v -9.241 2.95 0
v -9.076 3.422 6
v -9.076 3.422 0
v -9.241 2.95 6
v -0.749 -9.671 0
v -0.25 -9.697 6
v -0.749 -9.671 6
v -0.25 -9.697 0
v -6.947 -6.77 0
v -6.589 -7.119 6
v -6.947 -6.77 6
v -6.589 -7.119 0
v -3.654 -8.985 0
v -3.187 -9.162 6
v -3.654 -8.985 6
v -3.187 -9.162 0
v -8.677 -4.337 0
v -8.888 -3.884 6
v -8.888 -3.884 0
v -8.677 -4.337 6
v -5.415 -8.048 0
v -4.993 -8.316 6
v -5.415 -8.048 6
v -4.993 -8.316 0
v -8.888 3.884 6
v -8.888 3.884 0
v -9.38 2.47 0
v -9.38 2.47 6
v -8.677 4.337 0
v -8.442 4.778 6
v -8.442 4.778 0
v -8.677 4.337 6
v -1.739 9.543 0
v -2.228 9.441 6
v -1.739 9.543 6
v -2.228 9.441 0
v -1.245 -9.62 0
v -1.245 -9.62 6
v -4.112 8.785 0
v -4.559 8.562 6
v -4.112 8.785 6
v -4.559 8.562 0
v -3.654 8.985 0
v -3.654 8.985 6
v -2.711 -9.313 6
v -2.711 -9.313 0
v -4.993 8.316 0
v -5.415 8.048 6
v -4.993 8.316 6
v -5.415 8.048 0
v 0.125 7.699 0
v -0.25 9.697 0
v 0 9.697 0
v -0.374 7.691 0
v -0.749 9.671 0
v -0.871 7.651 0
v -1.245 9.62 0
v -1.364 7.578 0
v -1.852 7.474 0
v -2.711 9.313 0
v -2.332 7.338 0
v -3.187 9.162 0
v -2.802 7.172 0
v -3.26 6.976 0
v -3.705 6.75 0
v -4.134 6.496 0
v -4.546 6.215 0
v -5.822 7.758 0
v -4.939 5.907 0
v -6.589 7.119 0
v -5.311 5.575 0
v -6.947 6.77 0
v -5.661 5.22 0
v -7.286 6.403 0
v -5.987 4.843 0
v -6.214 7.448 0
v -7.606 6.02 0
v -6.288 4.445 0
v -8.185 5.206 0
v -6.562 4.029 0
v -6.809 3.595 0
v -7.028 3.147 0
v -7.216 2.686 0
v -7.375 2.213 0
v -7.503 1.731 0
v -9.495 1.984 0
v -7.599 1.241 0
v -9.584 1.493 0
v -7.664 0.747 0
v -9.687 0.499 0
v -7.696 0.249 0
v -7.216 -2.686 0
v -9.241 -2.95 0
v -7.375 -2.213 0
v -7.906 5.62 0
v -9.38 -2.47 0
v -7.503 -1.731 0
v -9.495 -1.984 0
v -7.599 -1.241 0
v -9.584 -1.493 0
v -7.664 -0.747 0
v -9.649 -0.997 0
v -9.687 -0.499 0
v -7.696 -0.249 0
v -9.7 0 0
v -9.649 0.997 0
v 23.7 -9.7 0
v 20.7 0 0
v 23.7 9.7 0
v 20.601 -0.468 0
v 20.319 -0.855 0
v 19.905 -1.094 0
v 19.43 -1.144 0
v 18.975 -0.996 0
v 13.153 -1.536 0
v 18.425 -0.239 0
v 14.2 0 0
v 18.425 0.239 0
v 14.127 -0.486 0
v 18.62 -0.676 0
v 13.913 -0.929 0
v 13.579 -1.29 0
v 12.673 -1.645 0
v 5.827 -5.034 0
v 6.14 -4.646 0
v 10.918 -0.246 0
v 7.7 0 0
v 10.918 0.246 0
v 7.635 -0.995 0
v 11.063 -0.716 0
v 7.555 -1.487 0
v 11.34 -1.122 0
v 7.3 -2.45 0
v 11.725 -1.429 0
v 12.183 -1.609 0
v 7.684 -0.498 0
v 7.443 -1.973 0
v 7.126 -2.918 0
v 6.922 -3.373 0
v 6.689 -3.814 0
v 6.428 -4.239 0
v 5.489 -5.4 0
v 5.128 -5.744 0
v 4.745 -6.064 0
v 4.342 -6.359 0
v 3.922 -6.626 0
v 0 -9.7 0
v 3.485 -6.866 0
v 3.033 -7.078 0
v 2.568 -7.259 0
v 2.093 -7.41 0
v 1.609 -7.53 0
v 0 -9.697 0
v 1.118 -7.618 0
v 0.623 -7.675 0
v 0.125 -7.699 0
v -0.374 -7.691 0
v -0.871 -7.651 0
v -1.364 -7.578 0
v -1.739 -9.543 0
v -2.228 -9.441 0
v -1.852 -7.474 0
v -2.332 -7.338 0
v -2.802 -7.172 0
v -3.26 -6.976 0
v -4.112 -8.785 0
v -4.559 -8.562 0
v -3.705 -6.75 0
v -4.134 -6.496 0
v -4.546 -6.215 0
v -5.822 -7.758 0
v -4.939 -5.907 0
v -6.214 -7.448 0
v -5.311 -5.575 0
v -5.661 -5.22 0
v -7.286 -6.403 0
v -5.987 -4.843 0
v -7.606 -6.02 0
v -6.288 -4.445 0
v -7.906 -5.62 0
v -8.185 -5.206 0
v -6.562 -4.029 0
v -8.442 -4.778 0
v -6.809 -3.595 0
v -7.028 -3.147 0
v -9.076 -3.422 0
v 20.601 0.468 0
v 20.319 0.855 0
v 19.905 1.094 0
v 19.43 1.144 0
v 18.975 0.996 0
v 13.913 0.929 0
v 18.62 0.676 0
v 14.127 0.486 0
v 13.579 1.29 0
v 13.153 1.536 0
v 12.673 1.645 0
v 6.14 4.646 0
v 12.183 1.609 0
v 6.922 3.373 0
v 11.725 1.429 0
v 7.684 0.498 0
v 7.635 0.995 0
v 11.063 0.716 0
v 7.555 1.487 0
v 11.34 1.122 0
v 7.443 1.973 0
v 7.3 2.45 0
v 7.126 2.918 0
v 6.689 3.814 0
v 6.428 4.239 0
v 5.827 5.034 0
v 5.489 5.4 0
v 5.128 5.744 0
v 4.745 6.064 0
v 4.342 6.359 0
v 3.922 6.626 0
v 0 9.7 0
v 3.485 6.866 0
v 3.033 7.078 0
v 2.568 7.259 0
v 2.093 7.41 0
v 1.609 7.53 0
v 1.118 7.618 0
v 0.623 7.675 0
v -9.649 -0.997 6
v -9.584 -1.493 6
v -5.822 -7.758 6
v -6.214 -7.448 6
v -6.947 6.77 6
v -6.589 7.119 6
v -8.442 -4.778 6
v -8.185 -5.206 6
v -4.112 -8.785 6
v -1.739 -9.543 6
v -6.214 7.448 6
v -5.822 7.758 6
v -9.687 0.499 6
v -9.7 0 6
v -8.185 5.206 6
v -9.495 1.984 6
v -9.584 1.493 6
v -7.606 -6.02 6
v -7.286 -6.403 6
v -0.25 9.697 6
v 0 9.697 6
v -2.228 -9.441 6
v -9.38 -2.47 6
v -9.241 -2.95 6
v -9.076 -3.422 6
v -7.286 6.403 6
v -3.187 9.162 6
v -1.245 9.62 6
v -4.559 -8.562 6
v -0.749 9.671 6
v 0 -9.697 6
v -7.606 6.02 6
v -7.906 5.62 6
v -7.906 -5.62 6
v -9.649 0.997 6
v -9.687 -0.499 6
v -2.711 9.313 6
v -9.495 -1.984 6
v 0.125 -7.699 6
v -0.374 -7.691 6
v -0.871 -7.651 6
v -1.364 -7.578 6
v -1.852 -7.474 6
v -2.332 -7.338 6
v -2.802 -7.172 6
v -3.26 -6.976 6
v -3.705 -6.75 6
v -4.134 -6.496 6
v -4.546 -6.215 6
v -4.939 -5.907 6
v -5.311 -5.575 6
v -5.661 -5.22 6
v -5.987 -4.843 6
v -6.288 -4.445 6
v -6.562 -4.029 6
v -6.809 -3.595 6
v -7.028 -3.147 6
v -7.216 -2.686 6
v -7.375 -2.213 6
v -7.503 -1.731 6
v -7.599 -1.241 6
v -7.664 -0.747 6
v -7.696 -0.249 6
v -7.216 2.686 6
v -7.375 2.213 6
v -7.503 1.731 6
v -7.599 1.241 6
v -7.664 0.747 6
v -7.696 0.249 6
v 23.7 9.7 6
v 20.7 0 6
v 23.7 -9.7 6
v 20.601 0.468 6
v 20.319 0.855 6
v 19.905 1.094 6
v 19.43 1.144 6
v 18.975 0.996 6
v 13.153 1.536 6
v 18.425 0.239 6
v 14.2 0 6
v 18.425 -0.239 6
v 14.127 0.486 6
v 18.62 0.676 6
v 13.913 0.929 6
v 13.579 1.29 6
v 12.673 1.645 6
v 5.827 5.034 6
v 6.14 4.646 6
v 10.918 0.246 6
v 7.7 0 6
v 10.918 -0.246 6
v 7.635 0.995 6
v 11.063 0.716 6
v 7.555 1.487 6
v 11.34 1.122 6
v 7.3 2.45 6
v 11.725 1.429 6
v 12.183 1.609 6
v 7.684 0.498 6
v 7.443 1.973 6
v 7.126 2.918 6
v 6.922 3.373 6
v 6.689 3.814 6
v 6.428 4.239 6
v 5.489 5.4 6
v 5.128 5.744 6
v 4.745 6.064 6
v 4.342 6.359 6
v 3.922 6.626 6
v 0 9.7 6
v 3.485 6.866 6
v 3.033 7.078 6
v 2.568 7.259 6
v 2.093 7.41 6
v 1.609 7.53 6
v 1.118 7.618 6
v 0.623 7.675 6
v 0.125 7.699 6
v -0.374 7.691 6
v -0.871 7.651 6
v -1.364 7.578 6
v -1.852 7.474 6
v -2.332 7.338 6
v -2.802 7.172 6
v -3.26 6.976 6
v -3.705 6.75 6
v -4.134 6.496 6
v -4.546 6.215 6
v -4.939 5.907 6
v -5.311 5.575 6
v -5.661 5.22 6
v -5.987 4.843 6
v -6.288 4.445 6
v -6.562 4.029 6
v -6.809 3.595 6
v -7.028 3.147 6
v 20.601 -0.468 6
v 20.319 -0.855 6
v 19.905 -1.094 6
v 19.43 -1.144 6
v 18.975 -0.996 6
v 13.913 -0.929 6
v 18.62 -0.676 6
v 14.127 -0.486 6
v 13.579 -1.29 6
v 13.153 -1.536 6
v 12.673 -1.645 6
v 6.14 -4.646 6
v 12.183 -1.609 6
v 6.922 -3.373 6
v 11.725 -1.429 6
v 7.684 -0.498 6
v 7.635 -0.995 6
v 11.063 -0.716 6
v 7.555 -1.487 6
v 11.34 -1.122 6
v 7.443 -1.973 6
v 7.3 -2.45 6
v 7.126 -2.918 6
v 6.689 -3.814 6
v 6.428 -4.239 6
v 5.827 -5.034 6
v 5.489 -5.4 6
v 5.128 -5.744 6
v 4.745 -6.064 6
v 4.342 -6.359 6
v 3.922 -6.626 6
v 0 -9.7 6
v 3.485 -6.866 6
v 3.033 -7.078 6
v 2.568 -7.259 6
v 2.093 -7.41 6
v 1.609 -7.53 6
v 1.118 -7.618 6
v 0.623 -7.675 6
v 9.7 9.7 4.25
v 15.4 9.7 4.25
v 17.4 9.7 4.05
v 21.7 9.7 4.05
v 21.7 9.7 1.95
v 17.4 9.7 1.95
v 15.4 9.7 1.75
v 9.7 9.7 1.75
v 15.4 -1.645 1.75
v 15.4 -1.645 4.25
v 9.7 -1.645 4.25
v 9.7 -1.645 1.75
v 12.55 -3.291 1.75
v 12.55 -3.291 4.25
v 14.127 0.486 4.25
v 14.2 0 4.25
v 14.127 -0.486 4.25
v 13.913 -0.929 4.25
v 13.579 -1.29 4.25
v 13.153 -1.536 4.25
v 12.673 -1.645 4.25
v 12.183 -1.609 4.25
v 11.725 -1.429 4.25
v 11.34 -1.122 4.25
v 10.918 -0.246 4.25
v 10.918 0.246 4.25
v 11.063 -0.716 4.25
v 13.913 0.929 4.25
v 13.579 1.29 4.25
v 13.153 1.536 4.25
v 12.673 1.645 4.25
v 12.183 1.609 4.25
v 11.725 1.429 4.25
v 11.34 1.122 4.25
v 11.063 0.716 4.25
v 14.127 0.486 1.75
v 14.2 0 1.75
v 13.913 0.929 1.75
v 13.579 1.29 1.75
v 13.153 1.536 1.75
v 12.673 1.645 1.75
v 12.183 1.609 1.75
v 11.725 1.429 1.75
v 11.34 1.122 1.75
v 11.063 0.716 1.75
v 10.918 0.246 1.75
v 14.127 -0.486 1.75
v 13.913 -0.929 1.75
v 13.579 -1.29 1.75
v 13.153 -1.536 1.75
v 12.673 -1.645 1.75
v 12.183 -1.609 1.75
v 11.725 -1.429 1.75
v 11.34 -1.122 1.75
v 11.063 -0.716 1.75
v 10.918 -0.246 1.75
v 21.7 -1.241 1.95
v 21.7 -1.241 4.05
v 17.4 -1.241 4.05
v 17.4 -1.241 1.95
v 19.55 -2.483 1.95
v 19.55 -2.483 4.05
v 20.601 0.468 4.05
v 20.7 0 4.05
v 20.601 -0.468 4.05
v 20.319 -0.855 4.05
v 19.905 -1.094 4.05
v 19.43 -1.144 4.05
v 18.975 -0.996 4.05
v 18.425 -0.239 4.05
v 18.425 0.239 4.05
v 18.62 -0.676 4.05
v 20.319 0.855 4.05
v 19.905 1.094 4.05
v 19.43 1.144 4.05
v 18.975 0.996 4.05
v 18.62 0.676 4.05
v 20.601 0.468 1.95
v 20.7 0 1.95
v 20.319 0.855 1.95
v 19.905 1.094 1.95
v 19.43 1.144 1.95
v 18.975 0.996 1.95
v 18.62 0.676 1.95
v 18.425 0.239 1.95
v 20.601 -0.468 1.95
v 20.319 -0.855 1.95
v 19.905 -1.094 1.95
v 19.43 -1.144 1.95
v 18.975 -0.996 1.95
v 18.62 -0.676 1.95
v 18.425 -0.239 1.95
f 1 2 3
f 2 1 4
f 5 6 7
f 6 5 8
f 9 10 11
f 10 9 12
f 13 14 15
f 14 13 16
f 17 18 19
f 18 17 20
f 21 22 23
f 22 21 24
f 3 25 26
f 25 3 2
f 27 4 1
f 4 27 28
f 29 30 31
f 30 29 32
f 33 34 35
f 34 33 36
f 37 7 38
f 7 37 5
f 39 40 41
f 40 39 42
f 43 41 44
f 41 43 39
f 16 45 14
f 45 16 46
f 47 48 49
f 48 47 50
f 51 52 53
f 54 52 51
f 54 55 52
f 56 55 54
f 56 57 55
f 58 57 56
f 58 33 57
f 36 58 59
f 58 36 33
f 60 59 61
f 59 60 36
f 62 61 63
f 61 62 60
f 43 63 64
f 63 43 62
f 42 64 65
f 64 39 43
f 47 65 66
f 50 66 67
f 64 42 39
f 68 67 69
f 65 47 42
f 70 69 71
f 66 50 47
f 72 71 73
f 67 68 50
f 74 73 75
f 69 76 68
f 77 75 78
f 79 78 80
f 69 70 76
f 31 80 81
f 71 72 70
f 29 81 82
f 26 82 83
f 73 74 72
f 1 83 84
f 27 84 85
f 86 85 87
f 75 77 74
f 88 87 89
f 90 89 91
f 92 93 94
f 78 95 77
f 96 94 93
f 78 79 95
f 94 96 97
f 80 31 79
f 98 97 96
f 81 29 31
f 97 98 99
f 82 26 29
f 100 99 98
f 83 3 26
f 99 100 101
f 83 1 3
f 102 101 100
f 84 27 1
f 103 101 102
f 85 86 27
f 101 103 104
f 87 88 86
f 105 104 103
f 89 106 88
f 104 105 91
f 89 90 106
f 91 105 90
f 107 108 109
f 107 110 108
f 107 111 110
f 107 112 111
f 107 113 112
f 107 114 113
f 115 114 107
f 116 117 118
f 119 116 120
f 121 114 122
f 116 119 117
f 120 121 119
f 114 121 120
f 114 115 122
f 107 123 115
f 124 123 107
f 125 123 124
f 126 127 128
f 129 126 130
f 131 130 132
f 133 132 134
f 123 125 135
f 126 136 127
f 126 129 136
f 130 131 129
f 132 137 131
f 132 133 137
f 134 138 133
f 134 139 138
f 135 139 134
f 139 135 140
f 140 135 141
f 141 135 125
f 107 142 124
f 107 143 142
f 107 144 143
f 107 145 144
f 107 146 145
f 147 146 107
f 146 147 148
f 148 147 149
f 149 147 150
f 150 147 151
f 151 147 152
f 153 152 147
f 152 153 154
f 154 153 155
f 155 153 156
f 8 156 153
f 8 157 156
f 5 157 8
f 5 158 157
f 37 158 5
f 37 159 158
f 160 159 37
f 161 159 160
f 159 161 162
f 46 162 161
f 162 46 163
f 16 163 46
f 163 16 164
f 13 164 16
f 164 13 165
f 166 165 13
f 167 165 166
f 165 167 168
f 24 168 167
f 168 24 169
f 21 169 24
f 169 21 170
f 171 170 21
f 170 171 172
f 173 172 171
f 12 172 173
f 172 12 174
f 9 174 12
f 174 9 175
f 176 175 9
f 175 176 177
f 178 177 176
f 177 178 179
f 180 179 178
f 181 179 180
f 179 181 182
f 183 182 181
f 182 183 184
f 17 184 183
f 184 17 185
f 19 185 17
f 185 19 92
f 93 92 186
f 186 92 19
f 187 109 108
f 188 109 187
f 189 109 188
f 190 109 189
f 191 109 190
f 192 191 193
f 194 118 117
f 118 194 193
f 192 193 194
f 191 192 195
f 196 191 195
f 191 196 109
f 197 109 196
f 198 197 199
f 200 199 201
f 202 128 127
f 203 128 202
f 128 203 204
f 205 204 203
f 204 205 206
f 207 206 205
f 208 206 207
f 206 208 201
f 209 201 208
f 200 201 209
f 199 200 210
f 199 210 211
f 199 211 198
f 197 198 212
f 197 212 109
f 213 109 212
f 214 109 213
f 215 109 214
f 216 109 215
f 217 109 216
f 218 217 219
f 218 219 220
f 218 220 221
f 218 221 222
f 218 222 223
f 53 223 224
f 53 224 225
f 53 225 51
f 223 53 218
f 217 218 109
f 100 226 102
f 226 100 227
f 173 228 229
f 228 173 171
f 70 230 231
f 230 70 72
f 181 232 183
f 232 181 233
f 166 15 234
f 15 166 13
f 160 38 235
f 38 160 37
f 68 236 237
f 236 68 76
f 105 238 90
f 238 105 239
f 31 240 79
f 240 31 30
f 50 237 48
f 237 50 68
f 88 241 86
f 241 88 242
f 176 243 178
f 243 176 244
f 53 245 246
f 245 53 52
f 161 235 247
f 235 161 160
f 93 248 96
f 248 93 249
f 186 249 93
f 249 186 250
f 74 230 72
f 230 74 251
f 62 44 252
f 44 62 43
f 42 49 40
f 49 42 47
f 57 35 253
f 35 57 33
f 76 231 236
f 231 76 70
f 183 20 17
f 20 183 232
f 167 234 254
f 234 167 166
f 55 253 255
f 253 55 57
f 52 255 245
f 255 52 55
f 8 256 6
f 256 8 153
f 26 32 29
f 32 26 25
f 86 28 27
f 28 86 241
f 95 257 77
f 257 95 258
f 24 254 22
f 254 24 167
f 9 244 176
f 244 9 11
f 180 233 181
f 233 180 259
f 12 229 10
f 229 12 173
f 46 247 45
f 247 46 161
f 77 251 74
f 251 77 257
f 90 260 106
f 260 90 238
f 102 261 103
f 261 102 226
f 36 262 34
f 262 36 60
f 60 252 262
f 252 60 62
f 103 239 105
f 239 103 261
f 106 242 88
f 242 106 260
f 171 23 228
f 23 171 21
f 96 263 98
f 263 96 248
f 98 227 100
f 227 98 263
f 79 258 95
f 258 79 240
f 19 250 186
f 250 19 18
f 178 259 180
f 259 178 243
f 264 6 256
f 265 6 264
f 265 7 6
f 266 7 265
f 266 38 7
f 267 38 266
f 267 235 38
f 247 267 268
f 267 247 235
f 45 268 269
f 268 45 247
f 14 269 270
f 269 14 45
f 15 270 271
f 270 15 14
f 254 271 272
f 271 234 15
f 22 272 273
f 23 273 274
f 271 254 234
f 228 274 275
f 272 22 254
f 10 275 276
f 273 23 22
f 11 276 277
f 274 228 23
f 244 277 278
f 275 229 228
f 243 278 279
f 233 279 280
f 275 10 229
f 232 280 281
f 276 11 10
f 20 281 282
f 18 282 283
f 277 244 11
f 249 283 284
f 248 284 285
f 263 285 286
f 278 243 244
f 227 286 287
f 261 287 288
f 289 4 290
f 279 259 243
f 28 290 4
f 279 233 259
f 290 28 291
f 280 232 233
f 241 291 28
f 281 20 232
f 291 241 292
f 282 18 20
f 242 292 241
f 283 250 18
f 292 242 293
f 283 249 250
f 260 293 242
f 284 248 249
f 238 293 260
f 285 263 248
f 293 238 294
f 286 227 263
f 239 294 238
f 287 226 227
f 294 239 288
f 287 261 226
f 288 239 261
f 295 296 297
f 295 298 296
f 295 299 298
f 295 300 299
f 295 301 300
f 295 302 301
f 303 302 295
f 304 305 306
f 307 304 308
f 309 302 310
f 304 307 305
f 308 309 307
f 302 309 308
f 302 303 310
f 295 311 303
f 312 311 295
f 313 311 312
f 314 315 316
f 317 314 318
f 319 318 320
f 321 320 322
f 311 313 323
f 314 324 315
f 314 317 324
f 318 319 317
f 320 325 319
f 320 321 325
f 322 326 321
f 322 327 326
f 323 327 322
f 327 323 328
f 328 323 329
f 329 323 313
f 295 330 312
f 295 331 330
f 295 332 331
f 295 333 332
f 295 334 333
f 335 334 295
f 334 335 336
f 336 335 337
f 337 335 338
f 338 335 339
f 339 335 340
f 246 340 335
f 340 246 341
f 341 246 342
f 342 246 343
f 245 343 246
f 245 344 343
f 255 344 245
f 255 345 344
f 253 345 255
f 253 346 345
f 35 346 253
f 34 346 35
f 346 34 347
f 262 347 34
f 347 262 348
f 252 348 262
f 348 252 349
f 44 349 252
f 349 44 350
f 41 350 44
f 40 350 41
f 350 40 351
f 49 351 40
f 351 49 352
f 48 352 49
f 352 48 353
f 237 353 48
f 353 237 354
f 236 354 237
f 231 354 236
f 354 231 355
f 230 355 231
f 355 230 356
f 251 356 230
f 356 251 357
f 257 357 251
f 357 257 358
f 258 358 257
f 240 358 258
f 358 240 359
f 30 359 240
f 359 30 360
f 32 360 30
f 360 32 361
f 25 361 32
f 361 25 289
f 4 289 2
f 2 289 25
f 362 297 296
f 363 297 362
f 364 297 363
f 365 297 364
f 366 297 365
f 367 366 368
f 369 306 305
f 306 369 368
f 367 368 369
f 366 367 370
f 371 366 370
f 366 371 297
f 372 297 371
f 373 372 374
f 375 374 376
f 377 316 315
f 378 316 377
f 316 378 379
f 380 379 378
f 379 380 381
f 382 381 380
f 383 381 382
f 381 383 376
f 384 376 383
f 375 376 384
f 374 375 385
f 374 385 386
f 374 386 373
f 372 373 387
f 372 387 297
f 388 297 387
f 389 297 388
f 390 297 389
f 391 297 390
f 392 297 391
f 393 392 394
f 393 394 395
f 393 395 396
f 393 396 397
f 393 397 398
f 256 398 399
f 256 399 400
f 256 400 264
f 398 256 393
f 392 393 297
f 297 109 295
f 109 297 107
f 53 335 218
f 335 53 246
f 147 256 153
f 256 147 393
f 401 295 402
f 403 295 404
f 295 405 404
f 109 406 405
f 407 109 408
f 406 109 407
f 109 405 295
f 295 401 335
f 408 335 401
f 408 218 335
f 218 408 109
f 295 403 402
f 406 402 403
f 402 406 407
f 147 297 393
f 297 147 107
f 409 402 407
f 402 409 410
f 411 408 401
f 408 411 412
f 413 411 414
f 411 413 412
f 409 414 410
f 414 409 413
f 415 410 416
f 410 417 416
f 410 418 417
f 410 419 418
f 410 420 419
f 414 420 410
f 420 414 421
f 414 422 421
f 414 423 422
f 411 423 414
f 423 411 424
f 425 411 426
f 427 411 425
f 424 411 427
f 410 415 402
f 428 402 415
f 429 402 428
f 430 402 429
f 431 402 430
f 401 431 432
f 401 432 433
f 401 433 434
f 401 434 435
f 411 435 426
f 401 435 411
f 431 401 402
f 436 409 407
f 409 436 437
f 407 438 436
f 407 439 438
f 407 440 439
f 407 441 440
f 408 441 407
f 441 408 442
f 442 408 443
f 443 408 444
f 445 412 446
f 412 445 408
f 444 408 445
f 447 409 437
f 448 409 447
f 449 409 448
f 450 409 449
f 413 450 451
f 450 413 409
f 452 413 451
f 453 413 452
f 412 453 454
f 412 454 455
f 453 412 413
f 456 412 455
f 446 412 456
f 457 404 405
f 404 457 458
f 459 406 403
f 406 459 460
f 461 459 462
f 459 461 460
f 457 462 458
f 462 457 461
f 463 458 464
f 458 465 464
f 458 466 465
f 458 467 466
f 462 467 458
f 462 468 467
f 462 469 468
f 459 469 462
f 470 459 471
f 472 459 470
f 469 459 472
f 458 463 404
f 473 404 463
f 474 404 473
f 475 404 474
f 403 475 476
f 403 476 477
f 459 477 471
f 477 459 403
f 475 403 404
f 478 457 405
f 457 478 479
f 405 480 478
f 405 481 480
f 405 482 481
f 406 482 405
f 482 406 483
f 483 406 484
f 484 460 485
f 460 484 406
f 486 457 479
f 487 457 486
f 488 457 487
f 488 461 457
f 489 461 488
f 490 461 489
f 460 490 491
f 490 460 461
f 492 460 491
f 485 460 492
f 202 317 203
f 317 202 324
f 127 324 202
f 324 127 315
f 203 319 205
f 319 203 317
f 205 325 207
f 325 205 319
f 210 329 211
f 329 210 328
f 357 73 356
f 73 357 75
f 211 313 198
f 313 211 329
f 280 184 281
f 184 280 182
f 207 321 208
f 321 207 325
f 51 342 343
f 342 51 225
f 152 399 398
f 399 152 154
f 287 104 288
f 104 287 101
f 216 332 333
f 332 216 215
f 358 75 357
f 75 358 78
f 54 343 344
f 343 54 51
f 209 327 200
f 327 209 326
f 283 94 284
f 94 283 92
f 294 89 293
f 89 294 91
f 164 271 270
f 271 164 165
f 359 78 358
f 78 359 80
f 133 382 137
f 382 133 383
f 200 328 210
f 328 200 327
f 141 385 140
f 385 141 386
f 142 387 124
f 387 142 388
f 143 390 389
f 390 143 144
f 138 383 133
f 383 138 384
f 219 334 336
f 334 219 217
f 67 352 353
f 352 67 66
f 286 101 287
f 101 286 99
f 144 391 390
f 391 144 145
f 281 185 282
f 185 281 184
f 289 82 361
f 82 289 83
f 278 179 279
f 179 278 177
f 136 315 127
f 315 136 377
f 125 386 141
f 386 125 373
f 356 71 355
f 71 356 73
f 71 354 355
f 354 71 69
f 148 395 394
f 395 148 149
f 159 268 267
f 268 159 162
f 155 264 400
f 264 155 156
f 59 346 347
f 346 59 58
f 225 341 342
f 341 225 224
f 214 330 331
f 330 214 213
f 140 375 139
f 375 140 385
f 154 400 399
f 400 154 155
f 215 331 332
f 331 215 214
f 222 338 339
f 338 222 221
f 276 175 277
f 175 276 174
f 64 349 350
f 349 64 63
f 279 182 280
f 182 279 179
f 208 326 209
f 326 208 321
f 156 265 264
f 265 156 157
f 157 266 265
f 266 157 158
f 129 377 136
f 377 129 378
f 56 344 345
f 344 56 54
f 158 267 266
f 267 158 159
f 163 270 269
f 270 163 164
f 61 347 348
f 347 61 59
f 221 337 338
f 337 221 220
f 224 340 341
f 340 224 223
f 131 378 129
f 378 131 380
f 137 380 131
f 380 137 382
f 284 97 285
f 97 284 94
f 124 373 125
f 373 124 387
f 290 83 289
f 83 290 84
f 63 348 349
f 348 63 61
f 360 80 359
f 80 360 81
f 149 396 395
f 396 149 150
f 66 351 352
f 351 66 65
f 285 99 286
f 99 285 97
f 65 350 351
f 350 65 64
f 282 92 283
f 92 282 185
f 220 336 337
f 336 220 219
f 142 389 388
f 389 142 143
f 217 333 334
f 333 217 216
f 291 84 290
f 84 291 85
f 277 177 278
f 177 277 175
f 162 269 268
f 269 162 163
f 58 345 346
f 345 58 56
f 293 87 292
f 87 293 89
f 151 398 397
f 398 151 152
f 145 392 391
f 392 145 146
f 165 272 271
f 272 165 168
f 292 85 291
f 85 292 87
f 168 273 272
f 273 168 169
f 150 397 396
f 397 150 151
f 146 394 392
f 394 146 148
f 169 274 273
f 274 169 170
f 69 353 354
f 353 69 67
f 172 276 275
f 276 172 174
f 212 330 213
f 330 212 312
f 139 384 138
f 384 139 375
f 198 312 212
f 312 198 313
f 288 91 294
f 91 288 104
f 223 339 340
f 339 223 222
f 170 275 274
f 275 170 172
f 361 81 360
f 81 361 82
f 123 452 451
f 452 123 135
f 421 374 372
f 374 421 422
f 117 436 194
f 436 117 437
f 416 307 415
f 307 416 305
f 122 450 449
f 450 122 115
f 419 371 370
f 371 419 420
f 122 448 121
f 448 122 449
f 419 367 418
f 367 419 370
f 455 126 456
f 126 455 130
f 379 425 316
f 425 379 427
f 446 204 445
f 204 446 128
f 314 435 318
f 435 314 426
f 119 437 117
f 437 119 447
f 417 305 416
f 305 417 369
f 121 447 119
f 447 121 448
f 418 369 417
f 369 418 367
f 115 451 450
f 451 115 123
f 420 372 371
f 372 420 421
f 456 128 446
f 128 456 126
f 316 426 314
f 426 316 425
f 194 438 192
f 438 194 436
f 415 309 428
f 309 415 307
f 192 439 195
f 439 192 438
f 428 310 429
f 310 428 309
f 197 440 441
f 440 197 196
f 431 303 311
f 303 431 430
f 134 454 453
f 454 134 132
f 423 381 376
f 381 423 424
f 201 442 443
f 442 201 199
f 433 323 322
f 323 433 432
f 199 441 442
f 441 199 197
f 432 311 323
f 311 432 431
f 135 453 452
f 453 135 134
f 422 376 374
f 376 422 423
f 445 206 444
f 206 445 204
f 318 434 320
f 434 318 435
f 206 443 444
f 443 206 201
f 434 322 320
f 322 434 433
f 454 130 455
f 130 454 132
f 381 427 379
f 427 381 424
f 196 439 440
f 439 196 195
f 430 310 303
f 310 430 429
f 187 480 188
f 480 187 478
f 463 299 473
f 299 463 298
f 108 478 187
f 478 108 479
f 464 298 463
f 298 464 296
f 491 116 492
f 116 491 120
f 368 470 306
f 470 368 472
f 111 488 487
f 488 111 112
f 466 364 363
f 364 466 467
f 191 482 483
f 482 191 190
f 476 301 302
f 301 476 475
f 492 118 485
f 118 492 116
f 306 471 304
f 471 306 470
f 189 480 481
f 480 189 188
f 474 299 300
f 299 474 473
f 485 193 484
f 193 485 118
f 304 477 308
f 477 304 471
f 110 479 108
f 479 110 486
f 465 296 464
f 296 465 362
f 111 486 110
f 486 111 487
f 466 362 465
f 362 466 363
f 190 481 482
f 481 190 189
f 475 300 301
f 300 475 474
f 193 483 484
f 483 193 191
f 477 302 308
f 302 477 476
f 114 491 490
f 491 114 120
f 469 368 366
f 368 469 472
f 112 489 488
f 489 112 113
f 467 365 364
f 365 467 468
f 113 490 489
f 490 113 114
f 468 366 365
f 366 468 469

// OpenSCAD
// file: metric.scad
// nuts
// nutMxW - width of nut, nutMxH - height of nut
// M2
nutM2W = 4.0+0.3;
nutM2H = 1.9+0.2;
nutM2D = nutM2W/cos(30);
// M3
nutM3W = 5.4+0.3;
nutM3H = 2.3+0.2;
nutM3D = nutM3W/cos(30);

// screws
// M2
screwM2D = 2+0.3;
screwM2HeadD = 3.8;
screwM2HeadH = 2.0;
// M3
screwM3D = 3+0.3;

// lm8uu
lm8uuD = 15+0.4; // Diameter of lm8uu
lm8uuL = 24.1; // Length of lm8uu

// E3Dv5

//fan
fanT = 10; //fanThickness
// file: fanHolder.scad
include<config.scad>

module nutInsideHole(nutParams=nutM2,depth=10) {
  union() {
    rotate([0,0,90])
      cylinder(d=nutParams[2],h=nutParams[1], $fn=6);
    translate([-nutParams[0]/2,0,0])
      cube([nutParams[0],(depth-nutParams[2]/2),nutParams[1]]);
  }
}

module fan30mmScrewHoles(l=hotendFanHolderH+2) {
  for(x=[-1,1]) 
    for(y=[-1,1]) 
      translate([x*24/2,y*24/2,0]) {
        translate([0,0,-l+nutM3H+1])
          cylinder(d=screwM3D,h=l);
        rotate([0,0,-x*90])
          nutInsideHole(nutParams=nutM3,depth=8);
      }
}

module nutShell(nutParams=nutM2) {
  union() {
    for(t=[-1,1])
    translate([0,0,t*nutParams[1]/2])
      sphere(d=nutParams[2]+2);
    cylinder(d=nutParams[2]+2,h=nutParams[1],center=true);
  }
}
module holderMountScrewHoles(l=16) {
  for(x=[-1,1]) 
    for(y=[-1,1]) 
      translate([x*fanHolderLugX,y*fanHolderLugY,0]) {
        translate([0,0,-1])
          cylinder(d=screwM2D,h=l-0.2+1);
        translate([0,0,l])
          cylinder(d=screwM2HeadD,h=carriageL-hotendFanHolderH-l+1);
        rotate([0,0,-x*90])
          nutInsideHole(nutParams=nutM2,depth=8);
      }
}

module fanBevel(h=hotendFanHolderH-centralGap) {
  hull() {
    cube([radiatorL,0.1,0.01]);
    translate([0,0,h-5])
      cube([radiatorL,(28-radiatorD)/2+0.1,0.01]);
  }
}
//bevel();

module hotendFanHolder() {
  holderH=hotendFanHolderH-centralGap;
  difference() {
    union() {
      difference() {
        translate([0,0,holderH/2])
          cube([radiatorL,50-lm8uuD,holderH],center=true);
        translate([0,0,-1])
          cylinder(r=28/2, h=holderH+2);
      }
      for(m=[0,1])
        mirror([0,m*1,0])
          translate([-radiatorL/2,-28/2-0.1,5])
            fanBevel(holderH);
    }
    translate([0,0,hotendFanHolderH])
      rotate([0,90,0])
        cylinder(d=radiatorD,h=radiatorL+2,center=true);
    for(y=[-1,1])
      translate([-(radiatorL/2-(lm8uuD)/2-wallThickness),y*25,0])
        cylinder(d=lm8uuD+3+0.2,h=2*lm8uuL,center=true);
    translate([0,0,1.75])
      #fan30mmScrewHoles();
    translate([0,0,10])
     holderMountScrewHoles();
  }

} 

hotendFanHolder();
// file: config.scad
include <metric.scad>;


$fa=0.5;
$fs=0.5;

radiatorL=31.8; // Length of radiator
radiatorD=25; // Diameter of radiator
hotendNeckD=9;
fanHoleD = 28; //Diameter of fan hole

rodDst = 50; // Distance berween rods



//hotendFanHolderGap=0.1; // Distance between body & holder
centralGap=2; // Distance between two parts of body
wallThickness = 1.5;


// Spetial settings
carriageL=2*lm8uuL+wallThickness*2+centralGap;
hotendFanHolderH=radiatorD/2+5; // z size of hotend's fun holder WITHOUT gap
//hotendFanHolderH=carriageL/2-10; // z size of hotend's fun holder WITHOUT gap
hotendXtranslate=carriageL/2-hotendFanHolderH-10; // Radiator -> Fan distance = 5mm


nutM2 = [nutM2W,nutM2H,nutM2D];
nutM3 = [nutM3W,nutM3H,nutM3D];
fanScewL = 16;
fanHolderLugX=(radiatorL-nutM2D)/2;
fanHolderLugY=(50-lm8uuD)/2-nutM2W/2-wallThickness+0.5;
fanHolderLugDst=sqrt(pow(fanHolderLugX,2)+pow(fanHolderLugY,2)); // Distance from center of lug hole to center of fan hole
fanHolderLugAngle=atan(fanHolderLugY/fanHolderLugX); // I don't know how to describe this))

hh = 0;
//holderNutTranslate = sqrt(pow(lm8uuD/2+wallThickness,2)-pow((lm8uuD/2+wallThickness+hh)-nutM2W/2,2));
holderNutTranslate = sqrt(pow(lm8uuD/2,2)-pow((lm8uuD/2+hh)-nutM2W/2,2));
holderScrewTranslate = sqrt(pow(lm8uuD/2+wallThickness,2)-pow((lm8uuD/2+wallThickness+hh)-screwM2HeadD/2,2));
//holderScrewTranslate = sqrt(pow(lm8uuD/2,2)-pow((lm8uuD/2+hh)-screwM2HeadD/2,2));

gt2PlateL=15;
gt2PlateTh=2*wallThickness;
// main file
include <config.scad>;
use <fanHolder.scad>;

difference() {
  union() {
    cylinder(d=lm8uuD+4, h=6);
    translate([0,-(lm8uuD+4)/2,0])
      cube([lm8uuD/2+2+nutM2W+2+nutM3W+2, lm8uuD+4, 6]);
  }
  translate([0,0,-1])
    cylinder(d=lm8uuD,h=6+2);
  translate([lm8uuD/2+2+nutM3W/2,0,-1])
    cylinder(d=screwM3D,h=6+2);
  translate([lm8uuD/2+2+nutM3W/2,0,6/2-nutM3H/2])
    #nutInsideHole(nutM3,14);
  translate([lm8uuD/2+2+nutM3W+2+nutM2W/2,0,-1])
    cylinder(d=screwM2D,h=6+2);
  translate([lm8uuD/2+2+nutM3W+2+nutM2W/2,0,6/2-nutM2H/2])
    #nutInsideHole(nutM2,14);
}
